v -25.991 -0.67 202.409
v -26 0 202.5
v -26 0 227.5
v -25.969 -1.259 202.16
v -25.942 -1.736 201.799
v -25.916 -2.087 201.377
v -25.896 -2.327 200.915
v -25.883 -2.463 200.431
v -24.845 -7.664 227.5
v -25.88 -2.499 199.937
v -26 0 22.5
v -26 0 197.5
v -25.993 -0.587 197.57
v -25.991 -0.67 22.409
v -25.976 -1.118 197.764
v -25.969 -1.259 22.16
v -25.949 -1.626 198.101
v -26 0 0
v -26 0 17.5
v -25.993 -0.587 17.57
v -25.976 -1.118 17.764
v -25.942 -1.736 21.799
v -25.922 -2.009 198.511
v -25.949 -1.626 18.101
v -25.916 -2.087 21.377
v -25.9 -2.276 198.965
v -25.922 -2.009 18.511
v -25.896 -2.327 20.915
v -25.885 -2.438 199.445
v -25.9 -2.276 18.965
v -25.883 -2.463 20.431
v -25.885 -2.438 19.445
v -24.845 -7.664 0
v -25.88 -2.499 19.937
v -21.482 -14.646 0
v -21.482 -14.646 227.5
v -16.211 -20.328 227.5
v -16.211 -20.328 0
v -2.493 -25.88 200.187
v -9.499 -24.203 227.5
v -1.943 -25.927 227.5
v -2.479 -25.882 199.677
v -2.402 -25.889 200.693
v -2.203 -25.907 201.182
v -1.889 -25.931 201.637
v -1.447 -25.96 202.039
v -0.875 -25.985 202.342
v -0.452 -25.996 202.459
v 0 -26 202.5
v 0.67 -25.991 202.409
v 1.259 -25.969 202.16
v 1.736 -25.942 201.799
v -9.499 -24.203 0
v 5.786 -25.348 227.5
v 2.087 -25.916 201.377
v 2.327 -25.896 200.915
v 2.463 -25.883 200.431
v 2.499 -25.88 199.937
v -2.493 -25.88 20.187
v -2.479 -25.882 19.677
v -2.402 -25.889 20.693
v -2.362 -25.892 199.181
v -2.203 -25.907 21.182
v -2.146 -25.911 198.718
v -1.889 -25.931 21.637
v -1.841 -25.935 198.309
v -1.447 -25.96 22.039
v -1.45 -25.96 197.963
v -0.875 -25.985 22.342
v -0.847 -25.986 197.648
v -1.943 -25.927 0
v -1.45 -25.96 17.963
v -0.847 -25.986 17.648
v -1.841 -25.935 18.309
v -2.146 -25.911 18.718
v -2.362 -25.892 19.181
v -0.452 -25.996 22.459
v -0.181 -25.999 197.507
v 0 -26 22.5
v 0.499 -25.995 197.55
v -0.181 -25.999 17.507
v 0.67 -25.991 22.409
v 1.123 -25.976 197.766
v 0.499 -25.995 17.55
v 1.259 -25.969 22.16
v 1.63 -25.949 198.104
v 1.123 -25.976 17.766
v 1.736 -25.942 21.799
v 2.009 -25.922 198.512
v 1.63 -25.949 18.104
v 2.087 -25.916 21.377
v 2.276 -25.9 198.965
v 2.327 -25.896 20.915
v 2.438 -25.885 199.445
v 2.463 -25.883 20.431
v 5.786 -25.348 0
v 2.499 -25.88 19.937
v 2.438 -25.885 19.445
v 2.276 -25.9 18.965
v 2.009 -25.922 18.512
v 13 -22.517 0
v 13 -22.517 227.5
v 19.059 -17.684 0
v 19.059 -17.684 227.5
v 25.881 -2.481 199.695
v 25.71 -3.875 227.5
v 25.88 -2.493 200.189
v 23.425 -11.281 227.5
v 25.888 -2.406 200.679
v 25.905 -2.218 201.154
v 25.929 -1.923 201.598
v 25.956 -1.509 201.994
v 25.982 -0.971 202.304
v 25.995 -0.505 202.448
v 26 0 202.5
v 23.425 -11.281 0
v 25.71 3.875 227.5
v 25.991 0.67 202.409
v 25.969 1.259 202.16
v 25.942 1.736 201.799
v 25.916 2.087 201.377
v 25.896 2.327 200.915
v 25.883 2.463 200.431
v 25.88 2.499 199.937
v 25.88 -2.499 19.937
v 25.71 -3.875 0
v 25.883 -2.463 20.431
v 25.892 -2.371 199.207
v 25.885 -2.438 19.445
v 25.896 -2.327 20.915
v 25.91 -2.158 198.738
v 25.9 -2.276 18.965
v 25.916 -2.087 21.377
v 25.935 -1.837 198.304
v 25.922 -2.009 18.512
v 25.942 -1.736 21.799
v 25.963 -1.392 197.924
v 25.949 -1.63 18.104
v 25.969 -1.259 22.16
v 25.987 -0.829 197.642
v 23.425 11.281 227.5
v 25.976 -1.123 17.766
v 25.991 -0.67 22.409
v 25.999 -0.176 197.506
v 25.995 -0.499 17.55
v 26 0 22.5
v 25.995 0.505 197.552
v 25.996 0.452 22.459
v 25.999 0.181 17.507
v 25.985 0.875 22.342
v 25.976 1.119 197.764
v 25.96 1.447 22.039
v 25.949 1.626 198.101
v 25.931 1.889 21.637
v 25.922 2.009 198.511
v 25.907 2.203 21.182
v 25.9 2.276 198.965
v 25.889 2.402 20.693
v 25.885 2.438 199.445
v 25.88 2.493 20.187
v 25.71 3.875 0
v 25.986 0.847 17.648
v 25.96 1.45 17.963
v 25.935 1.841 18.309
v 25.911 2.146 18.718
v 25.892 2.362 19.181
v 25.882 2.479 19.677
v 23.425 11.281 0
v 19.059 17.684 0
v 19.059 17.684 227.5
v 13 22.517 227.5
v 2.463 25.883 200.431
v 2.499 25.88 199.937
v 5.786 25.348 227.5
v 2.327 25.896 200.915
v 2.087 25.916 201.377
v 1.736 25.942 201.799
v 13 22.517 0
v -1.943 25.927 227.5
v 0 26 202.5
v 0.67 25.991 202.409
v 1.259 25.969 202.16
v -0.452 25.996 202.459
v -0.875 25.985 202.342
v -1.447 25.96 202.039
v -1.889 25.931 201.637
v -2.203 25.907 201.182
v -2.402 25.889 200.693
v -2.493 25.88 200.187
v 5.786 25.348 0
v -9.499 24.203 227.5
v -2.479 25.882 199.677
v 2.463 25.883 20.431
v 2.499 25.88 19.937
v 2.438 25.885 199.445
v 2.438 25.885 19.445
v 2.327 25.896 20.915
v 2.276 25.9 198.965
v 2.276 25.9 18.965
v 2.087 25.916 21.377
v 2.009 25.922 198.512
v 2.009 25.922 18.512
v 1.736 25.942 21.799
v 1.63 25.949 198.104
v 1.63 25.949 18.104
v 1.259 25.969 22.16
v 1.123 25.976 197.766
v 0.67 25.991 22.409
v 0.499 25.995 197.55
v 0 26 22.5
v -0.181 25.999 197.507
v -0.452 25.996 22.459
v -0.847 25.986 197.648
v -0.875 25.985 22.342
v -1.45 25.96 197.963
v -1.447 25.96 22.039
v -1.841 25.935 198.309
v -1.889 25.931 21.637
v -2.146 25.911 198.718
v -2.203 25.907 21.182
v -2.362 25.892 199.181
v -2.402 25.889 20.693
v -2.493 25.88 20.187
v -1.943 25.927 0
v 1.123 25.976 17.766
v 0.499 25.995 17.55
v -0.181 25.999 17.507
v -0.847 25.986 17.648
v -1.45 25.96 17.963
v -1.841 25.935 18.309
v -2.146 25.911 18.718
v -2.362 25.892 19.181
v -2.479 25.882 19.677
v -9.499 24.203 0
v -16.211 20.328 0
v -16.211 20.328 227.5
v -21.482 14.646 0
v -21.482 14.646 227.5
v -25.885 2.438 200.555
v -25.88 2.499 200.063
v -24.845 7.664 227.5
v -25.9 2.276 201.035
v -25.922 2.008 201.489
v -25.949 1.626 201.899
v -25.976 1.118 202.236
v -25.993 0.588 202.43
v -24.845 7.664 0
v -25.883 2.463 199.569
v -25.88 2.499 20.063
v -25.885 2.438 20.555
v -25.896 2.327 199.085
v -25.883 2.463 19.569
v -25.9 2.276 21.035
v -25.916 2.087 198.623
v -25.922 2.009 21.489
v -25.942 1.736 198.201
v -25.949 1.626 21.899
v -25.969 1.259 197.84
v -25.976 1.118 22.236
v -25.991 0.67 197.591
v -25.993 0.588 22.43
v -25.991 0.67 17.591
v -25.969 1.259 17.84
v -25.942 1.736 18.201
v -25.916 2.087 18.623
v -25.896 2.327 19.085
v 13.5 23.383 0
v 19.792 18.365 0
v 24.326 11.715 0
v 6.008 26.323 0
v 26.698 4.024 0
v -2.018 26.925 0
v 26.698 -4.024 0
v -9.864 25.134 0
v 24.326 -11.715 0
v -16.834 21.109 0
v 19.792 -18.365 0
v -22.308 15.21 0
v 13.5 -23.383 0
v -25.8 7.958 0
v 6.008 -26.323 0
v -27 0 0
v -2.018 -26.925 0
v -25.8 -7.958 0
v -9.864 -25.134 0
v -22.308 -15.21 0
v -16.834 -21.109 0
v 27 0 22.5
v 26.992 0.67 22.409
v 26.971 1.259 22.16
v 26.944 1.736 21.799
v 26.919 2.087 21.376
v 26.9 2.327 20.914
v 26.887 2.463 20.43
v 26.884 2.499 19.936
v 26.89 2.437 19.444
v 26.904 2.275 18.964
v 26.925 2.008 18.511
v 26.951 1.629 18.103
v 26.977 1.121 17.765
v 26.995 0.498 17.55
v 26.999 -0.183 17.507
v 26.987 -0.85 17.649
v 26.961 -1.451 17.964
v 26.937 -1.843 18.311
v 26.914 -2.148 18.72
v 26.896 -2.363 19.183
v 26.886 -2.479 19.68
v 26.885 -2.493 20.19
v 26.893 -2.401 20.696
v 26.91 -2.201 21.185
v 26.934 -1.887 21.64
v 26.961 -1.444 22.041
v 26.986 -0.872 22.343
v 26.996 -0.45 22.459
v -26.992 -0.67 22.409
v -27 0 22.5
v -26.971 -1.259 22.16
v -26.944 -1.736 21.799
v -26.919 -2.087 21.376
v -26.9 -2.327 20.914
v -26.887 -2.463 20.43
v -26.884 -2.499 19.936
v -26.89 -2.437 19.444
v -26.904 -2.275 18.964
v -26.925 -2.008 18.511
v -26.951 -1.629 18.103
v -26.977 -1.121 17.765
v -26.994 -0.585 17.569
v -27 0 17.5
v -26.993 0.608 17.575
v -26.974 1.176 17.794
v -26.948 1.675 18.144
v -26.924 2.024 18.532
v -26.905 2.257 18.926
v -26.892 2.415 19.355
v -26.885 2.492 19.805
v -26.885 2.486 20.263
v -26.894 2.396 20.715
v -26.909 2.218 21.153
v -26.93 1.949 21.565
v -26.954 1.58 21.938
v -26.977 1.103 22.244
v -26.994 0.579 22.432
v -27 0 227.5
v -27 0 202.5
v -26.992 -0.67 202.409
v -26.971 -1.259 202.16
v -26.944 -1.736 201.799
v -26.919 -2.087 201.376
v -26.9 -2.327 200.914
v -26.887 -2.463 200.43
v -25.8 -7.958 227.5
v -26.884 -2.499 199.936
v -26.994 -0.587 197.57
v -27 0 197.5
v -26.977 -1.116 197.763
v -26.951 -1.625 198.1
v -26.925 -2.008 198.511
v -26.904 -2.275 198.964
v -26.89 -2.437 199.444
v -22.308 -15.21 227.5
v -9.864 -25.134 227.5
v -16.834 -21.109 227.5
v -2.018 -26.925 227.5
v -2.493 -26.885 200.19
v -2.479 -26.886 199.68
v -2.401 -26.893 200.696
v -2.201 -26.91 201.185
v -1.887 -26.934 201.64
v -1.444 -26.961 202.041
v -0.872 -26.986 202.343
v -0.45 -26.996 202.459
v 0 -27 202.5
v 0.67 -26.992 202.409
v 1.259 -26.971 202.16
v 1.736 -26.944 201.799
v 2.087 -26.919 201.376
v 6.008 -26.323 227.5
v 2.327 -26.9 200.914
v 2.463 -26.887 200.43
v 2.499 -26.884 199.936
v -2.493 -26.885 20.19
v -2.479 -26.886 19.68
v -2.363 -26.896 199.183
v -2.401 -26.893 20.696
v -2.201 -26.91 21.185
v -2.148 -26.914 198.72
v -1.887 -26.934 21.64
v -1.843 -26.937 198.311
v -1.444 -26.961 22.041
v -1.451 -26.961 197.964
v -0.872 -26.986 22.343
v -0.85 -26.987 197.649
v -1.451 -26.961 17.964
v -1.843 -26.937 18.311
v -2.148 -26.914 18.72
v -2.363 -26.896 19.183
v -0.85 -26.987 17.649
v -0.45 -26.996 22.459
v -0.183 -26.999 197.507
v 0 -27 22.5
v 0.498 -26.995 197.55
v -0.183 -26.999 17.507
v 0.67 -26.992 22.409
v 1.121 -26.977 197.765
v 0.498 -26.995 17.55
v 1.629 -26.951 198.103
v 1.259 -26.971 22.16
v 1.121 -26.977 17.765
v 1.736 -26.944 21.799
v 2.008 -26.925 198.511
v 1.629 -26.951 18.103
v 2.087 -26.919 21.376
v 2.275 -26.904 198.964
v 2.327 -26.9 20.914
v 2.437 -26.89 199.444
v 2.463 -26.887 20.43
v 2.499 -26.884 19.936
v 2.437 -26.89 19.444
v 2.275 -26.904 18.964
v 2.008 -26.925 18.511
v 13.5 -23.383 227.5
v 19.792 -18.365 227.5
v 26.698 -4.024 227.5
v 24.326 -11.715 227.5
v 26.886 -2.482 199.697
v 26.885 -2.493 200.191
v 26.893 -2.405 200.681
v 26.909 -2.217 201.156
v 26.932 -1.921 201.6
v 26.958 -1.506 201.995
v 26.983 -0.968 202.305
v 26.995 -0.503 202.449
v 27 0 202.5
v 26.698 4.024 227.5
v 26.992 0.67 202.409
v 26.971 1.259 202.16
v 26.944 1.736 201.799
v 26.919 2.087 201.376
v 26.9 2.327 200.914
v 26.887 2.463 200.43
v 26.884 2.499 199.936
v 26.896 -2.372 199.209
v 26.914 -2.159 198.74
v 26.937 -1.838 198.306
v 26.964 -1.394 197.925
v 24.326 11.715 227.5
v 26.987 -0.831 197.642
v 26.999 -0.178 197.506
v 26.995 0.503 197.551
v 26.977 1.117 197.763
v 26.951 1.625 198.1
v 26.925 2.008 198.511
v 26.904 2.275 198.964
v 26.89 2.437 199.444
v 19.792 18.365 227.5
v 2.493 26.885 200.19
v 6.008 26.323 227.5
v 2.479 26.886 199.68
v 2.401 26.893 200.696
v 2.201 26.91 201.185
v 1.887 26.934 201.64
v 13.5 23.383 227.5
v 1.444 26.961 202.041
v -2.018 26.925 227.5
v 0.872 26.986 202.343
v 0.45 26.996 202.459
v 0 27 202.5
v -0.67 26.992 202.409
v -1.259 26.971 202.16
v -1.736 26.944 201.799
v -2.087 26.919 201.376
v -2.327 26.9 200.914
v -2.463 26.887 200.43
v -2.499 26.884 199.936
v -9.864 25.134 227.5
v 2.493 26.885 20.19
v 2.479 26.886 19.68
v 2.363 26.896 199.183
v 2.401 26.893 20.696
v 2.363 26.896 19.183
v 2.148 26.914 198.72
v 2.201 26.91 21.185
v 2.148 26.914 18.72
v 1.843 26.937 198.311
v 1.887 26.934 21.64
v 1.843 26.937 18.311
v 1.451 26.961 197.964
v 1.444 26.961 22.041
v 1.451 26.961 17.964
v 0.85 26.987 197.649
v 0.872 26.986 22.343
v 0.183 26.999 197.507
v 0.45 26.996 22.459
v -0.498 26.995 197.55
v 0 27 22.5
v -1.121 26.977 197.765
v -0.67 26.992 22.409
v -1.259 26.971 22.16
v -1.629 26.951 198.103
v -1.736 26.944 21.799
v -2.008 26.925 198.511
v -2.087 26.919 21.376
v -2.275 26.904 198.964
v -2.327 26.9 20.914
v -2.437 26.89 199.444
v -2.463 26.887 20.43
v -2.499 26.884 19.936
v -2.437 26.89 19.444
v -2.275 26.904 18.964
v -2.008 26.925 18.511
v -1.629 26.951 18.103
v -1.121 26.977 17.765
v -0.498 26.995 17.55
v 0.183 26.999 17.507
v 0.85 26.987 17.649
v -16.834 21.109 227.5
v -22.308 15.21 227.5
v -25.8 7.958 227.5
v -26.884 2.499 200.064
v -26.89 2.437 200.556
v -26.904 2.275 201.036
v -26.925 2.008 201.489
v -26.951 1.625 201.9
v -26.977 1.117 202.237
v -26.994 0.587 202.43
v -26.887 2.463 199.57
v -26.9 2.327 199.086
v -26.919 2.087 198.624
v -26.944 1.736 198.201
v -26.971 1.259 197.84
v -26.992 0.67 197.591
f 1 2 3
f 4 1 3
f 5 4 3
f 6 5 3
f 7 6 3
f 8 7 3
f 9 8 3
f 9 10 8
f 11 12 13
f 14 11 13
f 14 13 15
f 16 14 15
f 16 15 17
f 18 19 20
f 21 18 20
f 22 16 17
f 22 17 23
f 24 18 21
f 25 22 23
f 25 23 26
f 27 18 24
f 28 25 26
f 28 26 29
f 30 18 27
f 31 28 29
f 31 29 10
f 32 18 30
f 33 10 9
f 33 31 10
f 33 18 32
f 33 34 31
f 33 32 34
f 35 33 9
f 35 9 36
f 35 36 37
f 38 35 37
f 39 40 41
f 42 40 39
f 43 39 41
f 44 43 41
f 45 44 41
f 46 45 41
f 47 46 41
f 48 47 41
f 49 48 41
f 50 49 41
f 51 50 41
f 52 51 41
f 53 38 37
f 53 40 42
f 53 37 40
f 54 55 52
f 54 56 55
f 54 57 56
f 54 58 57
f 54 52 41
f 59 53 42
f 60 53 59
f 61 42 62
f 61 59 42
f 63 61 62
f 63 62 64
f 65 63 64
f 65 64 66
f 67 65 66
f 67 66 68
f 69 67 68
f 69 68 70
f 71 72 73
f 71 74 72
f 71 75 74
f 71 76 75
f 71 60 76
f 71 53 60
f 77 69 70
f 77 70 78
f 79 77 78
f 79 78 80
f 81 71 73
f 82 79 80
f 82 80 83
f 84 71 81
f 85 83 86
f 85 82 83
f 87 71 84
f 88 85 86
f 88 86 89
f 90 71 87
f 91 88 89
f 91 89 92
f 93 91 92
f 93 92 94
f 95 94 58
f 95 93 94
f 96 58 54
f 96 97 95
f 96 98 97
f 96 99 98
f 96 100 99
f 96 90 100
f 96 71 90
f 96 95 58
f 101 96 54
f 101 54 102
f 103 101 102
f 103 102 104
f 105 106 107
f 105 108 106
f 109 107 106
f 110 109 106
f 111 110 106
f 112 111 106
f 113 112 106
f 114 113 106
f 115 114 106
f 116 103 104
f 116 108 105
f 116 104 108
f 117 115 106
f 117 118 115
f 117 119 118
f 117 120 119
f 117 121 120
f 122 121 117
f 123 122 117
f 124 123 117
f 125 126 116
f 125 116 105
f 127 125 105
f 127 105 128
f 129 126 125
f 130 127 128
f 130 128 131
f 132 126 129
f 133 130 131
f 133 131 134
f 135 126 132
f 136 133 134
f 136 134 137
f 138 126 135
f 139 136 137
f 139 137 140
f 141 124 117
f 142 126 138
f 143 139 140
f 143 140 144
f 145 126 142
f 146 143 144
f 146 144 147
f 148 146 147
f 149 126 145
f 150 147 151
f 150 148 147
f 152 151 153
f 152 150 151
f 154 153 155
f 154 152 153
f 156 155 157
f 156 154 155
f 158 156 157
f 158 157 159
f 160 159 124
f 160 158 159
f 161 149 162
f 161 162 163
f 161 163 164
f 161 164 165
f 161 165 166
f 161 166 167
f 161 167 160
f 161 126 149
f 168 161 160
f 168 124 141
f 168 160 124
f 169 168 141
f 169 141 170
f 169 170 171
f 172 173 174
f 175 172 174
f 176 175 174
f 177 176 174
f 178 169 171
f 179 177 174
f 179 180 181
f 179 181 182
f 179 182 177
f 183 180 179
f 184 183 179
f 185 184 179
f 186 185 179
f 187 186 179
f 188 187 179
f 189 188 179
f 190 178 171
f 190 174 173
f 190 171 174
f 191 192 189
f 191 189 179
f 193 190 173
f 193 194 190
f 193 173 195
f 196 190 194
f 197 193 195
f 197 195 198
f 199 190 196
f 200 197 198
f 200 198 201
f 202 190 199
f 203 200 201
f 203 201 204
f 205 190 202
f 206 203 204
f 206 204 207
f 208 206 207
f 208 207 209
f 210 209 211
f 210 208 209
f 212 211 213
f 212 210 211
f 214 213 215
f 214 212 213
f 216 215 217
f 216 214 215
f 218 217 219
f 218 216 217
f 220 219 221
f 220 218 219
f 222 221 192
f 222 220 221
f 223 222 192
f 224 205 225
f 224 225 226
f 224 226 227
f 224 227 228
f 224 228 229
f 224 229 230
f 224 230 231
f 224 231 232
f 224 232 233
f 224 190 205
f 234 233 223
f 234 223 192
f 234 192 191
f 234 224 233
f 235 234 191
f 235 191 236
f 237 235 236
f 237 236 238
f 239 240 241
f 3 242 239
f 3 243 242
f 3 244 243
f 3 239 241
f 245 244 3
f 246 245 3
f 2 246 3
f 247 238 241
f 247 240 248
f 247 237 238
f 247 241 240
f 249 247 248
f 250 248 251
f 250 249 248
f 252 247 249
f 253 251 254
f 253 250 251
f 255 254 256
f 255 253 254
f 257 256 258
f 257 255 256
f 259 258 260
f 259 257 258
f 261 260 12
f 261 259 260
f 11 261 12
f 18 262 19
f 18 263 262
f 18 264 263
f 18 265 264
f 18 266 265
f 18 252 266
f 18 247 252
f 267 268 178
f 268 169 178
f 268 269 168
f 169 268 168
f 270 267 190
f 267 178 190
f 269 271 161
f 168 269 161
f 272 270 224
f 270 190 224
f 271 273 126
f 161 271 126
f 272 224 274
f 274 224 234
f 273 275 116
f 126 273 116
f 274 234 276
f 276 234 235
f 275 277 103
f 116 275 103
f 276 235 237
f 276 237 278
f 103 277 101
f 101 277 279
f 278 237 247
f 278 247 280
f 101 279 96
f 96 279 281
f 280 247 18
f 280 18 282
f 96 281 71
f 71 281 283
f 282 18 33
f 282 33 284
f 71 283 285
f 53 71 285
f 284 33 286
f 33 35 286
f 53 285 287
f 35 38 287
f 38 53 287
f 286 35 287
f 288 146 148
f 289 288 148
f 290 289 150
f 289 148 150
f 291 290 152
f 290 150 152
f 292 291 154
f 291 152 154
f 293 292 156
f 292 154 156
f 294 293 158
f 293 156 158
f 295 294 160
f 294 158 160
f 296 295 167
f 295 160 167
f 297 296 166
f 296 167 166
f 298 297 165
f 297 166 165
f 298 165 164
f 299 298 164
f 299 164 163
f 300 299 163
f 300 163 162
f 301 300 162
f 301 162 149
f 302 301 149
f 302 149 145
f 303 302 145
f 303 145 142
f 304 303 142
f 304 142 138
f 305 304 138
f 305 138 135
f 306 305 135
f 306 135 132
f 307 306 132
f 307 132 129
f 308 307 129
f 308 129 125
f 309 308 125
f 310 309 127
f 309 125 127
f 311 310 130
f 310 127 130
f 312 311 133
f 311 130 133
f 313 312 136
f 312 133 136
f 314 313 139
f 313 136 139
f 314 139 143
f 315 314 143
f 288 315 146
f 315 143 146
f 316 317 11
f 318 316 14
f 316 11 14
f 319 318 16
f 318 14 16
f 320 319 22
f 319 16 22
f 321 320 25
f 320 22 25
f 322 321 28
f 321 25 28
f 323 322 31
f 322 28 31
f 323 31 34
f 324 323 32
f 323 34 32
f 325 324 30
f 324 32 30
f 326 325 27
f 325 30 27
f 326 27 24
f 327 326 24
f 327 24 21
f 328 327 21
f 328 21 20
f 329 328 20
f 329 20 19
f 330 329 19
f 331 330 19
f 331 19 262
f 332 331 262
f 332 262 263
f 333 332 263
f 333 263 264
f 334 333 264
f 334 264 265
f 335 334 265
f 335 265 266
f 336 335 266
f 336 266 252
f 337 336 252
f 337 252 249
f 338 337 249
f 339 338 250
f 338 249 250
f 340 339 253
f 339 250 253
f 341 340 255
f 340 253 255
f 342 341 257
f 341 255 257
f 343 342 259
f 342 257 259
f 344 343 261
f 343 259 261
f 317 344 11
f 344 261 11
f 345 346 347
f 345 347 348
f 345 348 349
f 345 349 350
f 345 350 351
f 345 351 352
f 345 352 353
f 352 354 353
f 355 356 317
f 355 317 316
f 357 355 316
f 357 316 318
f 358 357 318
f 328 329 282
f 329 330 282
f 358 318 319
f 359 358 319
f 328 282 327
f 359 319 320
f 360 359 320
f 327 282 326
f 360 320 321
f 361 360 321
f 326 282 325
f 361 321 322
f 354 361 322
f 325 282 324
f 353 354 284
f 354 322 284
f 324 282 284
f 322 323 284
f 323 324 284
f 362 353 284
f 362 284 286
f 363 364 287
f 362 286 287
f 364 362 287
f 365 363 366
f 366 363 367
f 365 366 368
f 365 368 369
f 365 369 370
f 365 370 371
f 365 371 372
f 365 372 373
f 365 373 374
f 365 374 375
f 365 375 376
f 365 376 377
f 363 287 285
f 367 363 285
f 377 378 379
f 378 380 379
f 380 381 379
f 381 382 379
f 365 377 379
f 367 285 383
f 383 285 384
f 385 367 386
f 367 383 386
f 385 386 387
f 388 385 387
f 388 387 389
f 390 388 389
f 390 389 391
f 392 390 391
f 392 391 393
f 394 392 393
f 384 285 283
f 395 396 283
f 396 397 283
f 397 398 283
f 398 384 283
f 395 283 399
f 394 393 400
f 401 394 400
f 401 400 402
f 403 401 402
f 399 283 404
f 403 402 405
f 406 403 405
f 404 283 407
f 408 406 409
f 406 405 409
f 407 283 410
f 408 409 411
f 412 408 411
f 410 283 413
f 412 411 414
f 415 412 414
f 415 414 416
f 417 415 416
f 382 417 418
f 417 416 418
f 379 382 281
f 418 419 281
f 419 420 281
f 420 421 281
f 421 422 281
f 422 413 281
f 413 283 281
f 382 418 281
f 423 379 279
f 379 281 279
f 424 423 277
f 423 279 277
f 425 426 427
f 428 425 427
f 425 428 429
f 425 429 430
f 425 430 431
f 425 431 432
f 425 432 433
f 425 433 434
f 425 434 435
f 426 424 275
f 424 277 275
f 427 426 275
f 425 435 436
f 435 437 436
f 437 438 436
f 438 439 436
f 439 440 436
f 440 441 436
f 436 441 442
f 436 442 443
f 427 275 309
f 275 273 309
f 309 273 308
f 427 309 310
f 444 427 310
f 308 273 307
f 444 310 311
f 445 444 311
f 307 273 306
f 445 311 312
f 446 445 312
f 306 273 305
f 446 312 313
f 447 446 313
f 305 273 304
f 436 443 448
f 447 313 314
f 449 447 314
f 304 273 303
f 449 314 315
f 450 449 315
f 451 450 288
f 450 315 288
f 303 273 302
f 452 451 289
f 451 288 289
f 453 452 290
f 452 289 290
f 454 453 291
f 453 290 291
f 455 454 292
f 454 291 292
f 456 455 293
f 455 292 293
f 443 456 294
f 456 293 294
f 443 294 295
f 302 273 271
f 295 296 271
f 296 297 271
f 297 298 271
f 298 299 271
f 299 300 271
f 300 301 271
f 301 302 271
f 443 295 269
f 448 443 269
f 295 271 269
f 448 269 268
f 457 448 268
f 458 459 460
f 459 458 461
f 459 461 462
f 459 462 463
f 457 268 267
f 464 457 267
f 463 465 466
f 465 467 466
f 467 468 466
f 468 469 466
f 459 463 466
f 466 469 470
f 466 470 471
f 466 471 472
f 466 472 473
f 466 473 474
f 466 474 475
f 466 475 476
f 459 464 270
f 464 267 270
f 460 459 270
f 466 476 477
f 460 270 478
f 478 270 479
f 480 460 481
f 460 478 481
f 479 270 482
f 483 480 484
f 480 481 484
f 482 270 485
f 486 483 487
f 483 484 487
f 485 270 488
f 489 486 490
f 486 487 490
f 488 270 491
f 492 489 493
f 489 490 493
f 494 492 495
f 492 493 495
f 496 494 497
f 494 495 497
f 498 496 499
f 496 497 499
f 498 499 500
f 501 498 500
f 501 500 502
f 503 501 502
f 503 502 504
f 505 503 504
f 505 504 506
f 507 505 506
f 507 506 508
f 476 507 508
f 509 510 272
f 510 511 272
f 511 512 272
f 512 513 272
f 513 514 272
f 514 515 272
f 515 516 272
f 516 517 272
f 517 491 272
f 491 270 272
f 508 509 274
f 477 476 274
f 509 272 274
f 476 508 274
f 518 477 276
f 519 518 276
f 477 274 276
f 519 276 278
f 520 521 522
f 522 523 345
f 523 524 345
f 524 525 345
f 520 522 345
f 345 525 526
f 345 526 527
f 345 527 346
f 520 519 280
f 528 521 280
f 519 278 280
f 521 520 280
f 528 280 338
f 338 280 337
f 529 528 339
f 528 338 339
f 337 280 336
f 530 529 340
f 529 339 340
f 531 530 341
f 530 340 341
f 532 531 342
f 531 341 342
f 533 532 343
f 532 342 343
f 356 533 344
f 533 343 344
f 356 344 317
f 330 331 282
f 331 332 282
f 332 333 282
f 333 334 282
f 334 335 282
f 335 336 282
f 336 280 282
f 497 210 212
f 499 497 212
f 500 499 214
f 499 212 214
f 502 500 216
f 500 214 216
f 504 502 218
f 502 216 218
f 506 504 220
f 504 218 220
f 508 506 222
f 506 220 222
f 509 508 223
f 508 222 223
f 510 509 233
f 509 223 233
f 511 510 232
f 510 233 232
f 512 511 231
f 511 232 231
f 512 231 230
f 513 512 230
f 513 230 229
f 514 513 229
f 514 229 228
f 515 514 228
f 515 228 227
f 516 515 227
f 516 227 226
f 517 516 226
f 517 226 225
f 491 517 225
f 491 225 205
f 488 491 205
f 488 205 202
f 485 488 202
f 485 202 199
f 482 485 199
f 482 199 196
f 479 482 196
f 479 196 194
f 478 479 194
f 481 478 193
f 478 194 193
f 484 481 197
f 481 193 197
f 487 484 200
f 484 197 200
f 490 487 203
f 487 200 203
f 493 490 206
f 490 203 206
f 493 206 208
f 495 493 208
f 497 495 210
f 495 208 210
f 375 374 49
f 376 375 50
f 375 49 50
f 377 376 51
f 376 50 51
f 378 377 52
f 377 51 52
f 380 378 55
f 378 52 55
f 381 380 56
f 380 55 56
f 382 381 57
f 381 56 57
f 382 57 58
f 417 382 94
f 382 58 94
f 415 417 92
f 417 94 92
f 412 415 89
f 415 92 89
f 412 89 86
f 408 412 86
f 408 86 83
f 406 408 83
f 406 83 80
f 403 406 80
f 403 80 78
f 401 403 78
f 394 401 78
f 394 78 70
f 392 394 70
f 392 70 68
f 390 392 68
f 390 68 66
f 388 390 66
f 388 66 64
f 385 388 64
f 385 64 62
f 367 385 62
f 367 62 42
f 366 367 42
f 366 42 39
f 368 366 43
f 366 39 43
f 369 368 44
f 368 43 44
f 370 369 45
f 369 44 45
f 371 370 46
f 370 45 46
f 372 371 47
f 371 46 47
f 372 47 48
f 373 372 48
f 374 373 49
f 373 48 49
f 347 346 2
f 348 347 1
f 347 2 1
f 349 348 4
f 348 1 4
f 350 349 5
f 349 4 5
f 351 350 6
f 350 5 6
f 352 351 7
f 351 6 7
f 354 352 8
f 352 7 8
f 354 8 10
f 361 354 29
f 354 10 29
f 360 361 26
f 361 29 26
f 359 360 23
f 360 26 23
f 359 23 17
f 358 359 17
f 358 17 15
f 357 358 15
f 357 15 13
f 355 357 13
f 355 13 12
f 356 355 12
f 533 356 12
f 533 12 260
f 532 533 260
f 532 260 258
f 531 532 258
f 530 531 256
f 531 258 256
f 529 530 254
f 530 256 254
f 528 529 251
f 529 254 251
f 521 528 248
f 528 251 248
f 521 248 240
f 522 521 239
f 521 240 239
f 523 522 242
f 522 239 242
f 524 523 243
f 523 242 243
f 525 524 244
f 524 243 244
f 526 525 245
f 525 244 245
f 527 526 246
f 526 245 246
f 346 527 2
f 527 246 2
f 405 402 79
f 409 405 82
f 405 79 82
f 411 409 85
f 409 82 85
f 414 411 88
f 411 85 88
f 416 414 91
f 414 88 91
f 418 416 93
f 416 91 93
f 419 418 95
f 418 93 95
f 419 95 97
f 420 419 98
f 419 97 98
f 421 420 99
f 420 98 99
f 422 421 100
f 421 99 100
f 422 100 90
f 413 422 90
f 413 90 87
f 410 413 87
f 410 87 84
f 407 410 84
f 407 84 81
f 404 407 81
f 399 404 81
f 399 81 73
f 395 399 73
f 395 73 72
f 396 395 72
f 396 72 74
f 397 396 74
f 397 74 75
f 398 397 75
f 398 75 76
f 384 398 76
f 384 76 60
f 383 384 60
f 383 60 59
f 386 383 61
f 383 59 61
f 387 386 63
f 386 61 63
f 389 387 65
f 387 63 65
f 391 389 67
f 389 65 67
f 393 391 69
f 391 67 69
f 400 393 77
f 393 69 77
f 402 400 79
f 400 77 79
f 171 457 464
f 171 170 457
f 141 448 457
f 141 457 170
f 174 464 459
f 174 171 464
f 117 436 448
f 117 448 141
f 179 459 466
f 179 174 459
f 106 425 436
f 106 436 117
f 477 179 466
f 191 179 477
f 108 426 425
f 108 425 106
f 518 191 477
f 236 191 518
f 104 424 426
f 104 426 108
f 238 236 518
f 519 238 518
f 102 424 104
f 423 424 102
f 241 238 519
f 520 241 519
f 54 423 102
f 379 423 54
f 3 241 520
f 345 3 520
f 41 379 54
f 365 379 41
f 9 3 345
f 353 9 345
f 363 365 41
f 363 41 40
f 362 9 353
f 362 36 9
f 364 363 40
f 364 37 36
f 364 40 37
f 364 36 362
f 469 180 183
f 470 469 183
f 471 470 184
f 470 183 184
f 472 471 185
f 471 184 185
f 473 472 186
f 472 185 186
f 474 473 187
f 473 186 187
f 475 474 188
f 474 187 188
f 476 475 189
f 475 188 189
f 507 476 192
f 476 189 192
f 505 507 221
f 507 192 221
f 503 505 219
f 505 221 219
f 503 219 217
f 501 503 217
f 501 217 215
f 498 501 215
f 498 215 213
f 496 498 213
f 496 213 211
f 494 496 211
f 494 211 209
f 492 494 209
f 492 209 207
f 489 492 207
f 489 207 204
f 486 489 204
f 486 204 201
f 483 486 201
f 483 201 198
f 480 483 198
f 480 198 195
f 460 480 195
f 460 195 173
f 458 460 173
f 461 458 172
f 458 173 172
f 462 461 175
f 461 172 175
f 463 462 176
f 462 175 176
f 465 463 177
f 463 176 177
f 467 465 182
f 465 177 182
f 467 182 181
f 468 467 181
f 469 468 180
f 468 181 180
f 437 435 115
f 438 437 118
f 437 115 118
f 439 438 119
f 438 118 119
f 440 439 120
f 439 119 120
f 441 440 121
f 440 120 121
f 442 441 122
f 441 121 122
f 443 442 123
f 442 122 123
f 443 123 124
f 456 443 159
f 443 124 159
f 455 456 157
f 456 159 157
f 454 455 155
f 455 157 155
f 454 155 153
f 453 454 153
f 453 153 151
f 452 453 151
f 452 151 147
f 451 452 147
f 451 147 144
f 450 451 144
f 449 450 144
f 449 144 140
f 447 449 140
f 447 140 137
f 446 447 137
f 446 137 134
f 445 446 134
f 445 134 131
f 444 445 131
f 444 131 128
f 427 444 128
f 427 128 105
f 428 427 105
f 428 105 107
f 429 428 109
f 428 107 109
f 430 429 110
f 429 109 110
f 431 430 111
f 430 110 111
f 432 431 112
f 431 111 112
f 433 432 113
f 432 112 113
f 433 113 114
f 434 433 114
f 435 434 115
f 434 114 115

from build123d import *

# Parameters (mm, degrees)
SKETCH1_R                           = 27
SKETCH1_R_2                         = 26
BOSS_EXTRUDE1_DEPTH                 = 227.5
CUT_EXTRUDE1_REACH                  = 232.682
CUT_EXTRUDE1_END_RADIUS             = 27
SKETCH2_R                           = 2.5
CUT_EXTRUDE1_DIRECTION_2_REACH      = 232.682
CUT_EXTRUDE1_DIRECTION_2_END_RADIUS = 26
LPATTERN1_COUNT                     = 2
LPATTERN1_PITCH                     = 180
CIRPATTERN2_COUNT                   = 4
CIRPATTERN2_COPY_1_REACH            = 232.682
CIRPATTERN2_COPY_1_END_RADIUS       = 27
CIRPATTERN2_COPY_1_SKETCH_R         = 2.5
CIRPATTERN2_COPY_2_REACH            = 232.682
CIRPATTERN2_COPY_2_END_RADIUS       = 27
CIRPATTERN2_COPY_2_SKETCH_R         = 2.5
CIRPATTERN2_COPY_3_REACH            = 232.682
CIRPATTERN2_COPY_3_END_RADIUS       = 27
CIRPATTERN2_COPY_3_SKETCH_R         = 2.5


with BuildPart() as part:
    # Sketch1 → Boss-Extrude1 (new body)
    with BuildSketch(Plane.XY):
        with Locations(Location((0, 0, 0), (0, 0, 180))):
            Circle(SKETCH1_R)
        with Locations(Location((0, 0, 0), (0, 0, 180))):
            Circle(SKETCH1_R_2, mode=Mode.SUBTRACT)
    extrude(amount=BOSS_EXTRUDE1_DEPTH)

    # Cut-Extrude1: up to this cylinder (the profile starts inside it)
    cut_extrude1_end = Plane(origin=(0, 0, 20), z_dir=(0, 0, -1)) * Cylinder(CUT_EXTRUDE1_END_RADIUS, 520.364, mode=Mode.PRIVATE)
    # Sketch2 → Cut-Extrude1 (cut, up to the surface)
    with BuildSketch(Plane(origin=(0, 0, 0), x_dir=(1, 0, 0), z_dir=(0, 1, 0)), mode=Mode.PRIVATE) as cut_extrude1_sk1:
        with Locations(Location((0, -20, 0), (0, 0, 270))):
            Circle(SKETCH2_R)
    cut_extrude1_tool1 = extrude(cut_extrude1_sk1.sketch, amount=-CUT_EXTRUDE1_REACH, mode=Mode.PRIVATE) & cut_extrude1_end
    cut_extrude1 = cut_extrude1_tool1.solids().sort_by_distance((0, 0, 20))[0]
    add(cut_extrude1, mode=Mode.SUBTRACT)

    # Cut-Extrude1 direction 2: up to this cylinder (the profile starts inside it)
    cut_extrude1_direction_2_end = Plane(origin=(0, 0, 20), z_dir=(0, 0, -1)) * Cylinder(CUT_EXTRUDE1_DIRECTION_2_END_RADIUS, 518.364, mode=Mode.PRIVATE)
    # Sketch2 → Cut-Extrude1 direction 2 (cut, up to the surface)
    with BuildSketch(Plane(origin=(0, 0, 0), x_dir=(1, 0, 0), z_dir=(0, 1, 0)), mode=Mode.PRIVATE) as cut_extrude1_direction_2_sk1:
        with Locations(Location((0, -20, 0), (0, 0, 270))):
            Circle(SKETCH2_R)
    cut_extrude1_direction_2_tool1 = extrude(cut_extrude1_direction_2_sk1.sketch, amount=CUT_EXTRUDE1_DIRECTION_2_REACH, mode=Mode.PRIVATE) & cut_extrude1_direction_2_end
    cut_extrude1_direction_2 = cut_extrude1_direction_2_tool1.solids().sort_by_distance((0, 0, 20))[0]
    add(cut_extrude1_direction_2, mode=Mode.SUBTRACT)
    cut_extrude1 = cut_extrude1 + cut_extrude1_direction_2  # both directions under the feature's name, for the pattern or mirror that repeats it

    # LPattern1: Cut-Extrude1 ×2
    with Locations(*[(0, 0, i * LPATTERN1_PITCH) for i in range(1, LPATTERN1_COUNT)]):
        add(cut_extrude1, mode=Mode.SUBTRACT)

    # CirPattern2: Cut-Extrude1 ×4 about axis
    cirpattern2_axis = Axis((0, 0, 227.5), (0, 0, -1))
    for i in range(1, CIRPATTERN2_COUNT):
        add(cut_extrude1.rotate(cirpattern2_axis, i * 360 / CIRPATTERN2_COUNT), mode=Mode.SUBTRACT)

    # CirPattern2 copy 1: up to this cylinder (the profile starts inside it)
    cirpattern2_copy_1_end = Plane(origin=(0, 0, 20), z_dir=(0, 0, -1)) * Cylinder(CIRPATTERN2_COPY_1_END_RADIUS, 520.364, mode=Mode.PRIVATE)
    # CirPattern2 copy 1 sketch → CirPattern2 copy 1 (cut, up to the surface)
    with BuildSketch(Plane(origin=(0, 0, 180), x_dir=(0, -1, 0), z_dir=(1, 0, 0)), mode=Mode.PRIVATE) as cirpattern2_copy_1_sk1:
        with Locations(Location((0, -20, 0), (0, 0, 270))):
            Circle(CIRPATTERN2_COPY_1_SKETCH_R)
    cirpattern2_copy_1_tool1 = extrude(cirpattern2_copy_1_sk1.sketch, amount=-CIRPATTERN2_COPY_1_REACH, mode=Mode.PRIVATE) & cirpattern2_copy_1_end
    add(cirpattern2_copy_1_tool1.solids().sort_by_distance((0, 0, 20))[0], mode=Mode.SUBTRACT)

    # CirPattern2 copy 2: up to this cylinder (the profile starts inside it)
    cirpattern2_copy_2_end = Plane(origin=(0, 0, 20), z_dir=(0, 0, -1)) * Cylinder(CIRPATTERN2_COPY_2_END_RADIUS, 520.364, mode=Mode.PRIVATE)
    # CirPattern2 copy 2 sketch → CirPattern2 copy 2 (cut, up to the surface)
    with BuildSketch(Plane(origin=(0, 0, 180), x_dir=(-1, 0, 0), z_dir=(0, -1, 0)), mode=Mode.PRIVATE) as cirpattern2_copy_2_sk1:
        with Locations(Location((0, -20, 0), (0, 0, 270))):
            Circle(CIRPATTERN2_COPY_2_SKETCH_R)
    cirpattern2_copy_2_tool1 = extrude(cirpattern2_copy_2_sk1.sketch, amount=-CIRPATTERN2_COPY_2_REACH, mode=Mode.PRIVATE) & cirpattern2_copy_2_end
    add(cirpattern2_copy_2_tool1.solids().sort_by_distance((0, 0, 20))[0], mode=Mode.SUBTRACT)

    # CirPattern2 copy 3: up to this cylinder (the profile starts inside it)
    cirpattern2_copy_3_end = Plane(origin=(0, 0, 20), z_dir=(0, 0, -1)) * Cylinder(CIRPATTERN2_COPY_3_END_RADIUS, 520.364, mode=Mode.PRIVATE)
    # CirPattern2 copy 3 sketch → CirPattern2 copy 3 (cut, up to the surface)
    with BuildSketch(Plane(origin=(0, 0, 180), x_dir=(0, 1, 0), z_dir=(-1, 0, 0)), mode=Mode.PRIVATE) as cirpattern2_copy_3_sk1:
        with Locations(Location((0, -20, 0), (0, 0, 270))):
            Circle(CIRPATTERN2_COPY_3_SKETCH_R)
    cirpattern2_copy_3_tool1 = extrude(cirpattern2_copy_3_sk1.sketch, amount=-CIRPATTERN2_COPY_3_REACH, mode=Mode.PRIVATE) & cirpattern2_copy_3_end
    add(cirpattern2_copy_3_tool1.solids().sort_by_distance((0, 0, 20))[0], mode=Mode.SUBTRACT)


solid = part.part
